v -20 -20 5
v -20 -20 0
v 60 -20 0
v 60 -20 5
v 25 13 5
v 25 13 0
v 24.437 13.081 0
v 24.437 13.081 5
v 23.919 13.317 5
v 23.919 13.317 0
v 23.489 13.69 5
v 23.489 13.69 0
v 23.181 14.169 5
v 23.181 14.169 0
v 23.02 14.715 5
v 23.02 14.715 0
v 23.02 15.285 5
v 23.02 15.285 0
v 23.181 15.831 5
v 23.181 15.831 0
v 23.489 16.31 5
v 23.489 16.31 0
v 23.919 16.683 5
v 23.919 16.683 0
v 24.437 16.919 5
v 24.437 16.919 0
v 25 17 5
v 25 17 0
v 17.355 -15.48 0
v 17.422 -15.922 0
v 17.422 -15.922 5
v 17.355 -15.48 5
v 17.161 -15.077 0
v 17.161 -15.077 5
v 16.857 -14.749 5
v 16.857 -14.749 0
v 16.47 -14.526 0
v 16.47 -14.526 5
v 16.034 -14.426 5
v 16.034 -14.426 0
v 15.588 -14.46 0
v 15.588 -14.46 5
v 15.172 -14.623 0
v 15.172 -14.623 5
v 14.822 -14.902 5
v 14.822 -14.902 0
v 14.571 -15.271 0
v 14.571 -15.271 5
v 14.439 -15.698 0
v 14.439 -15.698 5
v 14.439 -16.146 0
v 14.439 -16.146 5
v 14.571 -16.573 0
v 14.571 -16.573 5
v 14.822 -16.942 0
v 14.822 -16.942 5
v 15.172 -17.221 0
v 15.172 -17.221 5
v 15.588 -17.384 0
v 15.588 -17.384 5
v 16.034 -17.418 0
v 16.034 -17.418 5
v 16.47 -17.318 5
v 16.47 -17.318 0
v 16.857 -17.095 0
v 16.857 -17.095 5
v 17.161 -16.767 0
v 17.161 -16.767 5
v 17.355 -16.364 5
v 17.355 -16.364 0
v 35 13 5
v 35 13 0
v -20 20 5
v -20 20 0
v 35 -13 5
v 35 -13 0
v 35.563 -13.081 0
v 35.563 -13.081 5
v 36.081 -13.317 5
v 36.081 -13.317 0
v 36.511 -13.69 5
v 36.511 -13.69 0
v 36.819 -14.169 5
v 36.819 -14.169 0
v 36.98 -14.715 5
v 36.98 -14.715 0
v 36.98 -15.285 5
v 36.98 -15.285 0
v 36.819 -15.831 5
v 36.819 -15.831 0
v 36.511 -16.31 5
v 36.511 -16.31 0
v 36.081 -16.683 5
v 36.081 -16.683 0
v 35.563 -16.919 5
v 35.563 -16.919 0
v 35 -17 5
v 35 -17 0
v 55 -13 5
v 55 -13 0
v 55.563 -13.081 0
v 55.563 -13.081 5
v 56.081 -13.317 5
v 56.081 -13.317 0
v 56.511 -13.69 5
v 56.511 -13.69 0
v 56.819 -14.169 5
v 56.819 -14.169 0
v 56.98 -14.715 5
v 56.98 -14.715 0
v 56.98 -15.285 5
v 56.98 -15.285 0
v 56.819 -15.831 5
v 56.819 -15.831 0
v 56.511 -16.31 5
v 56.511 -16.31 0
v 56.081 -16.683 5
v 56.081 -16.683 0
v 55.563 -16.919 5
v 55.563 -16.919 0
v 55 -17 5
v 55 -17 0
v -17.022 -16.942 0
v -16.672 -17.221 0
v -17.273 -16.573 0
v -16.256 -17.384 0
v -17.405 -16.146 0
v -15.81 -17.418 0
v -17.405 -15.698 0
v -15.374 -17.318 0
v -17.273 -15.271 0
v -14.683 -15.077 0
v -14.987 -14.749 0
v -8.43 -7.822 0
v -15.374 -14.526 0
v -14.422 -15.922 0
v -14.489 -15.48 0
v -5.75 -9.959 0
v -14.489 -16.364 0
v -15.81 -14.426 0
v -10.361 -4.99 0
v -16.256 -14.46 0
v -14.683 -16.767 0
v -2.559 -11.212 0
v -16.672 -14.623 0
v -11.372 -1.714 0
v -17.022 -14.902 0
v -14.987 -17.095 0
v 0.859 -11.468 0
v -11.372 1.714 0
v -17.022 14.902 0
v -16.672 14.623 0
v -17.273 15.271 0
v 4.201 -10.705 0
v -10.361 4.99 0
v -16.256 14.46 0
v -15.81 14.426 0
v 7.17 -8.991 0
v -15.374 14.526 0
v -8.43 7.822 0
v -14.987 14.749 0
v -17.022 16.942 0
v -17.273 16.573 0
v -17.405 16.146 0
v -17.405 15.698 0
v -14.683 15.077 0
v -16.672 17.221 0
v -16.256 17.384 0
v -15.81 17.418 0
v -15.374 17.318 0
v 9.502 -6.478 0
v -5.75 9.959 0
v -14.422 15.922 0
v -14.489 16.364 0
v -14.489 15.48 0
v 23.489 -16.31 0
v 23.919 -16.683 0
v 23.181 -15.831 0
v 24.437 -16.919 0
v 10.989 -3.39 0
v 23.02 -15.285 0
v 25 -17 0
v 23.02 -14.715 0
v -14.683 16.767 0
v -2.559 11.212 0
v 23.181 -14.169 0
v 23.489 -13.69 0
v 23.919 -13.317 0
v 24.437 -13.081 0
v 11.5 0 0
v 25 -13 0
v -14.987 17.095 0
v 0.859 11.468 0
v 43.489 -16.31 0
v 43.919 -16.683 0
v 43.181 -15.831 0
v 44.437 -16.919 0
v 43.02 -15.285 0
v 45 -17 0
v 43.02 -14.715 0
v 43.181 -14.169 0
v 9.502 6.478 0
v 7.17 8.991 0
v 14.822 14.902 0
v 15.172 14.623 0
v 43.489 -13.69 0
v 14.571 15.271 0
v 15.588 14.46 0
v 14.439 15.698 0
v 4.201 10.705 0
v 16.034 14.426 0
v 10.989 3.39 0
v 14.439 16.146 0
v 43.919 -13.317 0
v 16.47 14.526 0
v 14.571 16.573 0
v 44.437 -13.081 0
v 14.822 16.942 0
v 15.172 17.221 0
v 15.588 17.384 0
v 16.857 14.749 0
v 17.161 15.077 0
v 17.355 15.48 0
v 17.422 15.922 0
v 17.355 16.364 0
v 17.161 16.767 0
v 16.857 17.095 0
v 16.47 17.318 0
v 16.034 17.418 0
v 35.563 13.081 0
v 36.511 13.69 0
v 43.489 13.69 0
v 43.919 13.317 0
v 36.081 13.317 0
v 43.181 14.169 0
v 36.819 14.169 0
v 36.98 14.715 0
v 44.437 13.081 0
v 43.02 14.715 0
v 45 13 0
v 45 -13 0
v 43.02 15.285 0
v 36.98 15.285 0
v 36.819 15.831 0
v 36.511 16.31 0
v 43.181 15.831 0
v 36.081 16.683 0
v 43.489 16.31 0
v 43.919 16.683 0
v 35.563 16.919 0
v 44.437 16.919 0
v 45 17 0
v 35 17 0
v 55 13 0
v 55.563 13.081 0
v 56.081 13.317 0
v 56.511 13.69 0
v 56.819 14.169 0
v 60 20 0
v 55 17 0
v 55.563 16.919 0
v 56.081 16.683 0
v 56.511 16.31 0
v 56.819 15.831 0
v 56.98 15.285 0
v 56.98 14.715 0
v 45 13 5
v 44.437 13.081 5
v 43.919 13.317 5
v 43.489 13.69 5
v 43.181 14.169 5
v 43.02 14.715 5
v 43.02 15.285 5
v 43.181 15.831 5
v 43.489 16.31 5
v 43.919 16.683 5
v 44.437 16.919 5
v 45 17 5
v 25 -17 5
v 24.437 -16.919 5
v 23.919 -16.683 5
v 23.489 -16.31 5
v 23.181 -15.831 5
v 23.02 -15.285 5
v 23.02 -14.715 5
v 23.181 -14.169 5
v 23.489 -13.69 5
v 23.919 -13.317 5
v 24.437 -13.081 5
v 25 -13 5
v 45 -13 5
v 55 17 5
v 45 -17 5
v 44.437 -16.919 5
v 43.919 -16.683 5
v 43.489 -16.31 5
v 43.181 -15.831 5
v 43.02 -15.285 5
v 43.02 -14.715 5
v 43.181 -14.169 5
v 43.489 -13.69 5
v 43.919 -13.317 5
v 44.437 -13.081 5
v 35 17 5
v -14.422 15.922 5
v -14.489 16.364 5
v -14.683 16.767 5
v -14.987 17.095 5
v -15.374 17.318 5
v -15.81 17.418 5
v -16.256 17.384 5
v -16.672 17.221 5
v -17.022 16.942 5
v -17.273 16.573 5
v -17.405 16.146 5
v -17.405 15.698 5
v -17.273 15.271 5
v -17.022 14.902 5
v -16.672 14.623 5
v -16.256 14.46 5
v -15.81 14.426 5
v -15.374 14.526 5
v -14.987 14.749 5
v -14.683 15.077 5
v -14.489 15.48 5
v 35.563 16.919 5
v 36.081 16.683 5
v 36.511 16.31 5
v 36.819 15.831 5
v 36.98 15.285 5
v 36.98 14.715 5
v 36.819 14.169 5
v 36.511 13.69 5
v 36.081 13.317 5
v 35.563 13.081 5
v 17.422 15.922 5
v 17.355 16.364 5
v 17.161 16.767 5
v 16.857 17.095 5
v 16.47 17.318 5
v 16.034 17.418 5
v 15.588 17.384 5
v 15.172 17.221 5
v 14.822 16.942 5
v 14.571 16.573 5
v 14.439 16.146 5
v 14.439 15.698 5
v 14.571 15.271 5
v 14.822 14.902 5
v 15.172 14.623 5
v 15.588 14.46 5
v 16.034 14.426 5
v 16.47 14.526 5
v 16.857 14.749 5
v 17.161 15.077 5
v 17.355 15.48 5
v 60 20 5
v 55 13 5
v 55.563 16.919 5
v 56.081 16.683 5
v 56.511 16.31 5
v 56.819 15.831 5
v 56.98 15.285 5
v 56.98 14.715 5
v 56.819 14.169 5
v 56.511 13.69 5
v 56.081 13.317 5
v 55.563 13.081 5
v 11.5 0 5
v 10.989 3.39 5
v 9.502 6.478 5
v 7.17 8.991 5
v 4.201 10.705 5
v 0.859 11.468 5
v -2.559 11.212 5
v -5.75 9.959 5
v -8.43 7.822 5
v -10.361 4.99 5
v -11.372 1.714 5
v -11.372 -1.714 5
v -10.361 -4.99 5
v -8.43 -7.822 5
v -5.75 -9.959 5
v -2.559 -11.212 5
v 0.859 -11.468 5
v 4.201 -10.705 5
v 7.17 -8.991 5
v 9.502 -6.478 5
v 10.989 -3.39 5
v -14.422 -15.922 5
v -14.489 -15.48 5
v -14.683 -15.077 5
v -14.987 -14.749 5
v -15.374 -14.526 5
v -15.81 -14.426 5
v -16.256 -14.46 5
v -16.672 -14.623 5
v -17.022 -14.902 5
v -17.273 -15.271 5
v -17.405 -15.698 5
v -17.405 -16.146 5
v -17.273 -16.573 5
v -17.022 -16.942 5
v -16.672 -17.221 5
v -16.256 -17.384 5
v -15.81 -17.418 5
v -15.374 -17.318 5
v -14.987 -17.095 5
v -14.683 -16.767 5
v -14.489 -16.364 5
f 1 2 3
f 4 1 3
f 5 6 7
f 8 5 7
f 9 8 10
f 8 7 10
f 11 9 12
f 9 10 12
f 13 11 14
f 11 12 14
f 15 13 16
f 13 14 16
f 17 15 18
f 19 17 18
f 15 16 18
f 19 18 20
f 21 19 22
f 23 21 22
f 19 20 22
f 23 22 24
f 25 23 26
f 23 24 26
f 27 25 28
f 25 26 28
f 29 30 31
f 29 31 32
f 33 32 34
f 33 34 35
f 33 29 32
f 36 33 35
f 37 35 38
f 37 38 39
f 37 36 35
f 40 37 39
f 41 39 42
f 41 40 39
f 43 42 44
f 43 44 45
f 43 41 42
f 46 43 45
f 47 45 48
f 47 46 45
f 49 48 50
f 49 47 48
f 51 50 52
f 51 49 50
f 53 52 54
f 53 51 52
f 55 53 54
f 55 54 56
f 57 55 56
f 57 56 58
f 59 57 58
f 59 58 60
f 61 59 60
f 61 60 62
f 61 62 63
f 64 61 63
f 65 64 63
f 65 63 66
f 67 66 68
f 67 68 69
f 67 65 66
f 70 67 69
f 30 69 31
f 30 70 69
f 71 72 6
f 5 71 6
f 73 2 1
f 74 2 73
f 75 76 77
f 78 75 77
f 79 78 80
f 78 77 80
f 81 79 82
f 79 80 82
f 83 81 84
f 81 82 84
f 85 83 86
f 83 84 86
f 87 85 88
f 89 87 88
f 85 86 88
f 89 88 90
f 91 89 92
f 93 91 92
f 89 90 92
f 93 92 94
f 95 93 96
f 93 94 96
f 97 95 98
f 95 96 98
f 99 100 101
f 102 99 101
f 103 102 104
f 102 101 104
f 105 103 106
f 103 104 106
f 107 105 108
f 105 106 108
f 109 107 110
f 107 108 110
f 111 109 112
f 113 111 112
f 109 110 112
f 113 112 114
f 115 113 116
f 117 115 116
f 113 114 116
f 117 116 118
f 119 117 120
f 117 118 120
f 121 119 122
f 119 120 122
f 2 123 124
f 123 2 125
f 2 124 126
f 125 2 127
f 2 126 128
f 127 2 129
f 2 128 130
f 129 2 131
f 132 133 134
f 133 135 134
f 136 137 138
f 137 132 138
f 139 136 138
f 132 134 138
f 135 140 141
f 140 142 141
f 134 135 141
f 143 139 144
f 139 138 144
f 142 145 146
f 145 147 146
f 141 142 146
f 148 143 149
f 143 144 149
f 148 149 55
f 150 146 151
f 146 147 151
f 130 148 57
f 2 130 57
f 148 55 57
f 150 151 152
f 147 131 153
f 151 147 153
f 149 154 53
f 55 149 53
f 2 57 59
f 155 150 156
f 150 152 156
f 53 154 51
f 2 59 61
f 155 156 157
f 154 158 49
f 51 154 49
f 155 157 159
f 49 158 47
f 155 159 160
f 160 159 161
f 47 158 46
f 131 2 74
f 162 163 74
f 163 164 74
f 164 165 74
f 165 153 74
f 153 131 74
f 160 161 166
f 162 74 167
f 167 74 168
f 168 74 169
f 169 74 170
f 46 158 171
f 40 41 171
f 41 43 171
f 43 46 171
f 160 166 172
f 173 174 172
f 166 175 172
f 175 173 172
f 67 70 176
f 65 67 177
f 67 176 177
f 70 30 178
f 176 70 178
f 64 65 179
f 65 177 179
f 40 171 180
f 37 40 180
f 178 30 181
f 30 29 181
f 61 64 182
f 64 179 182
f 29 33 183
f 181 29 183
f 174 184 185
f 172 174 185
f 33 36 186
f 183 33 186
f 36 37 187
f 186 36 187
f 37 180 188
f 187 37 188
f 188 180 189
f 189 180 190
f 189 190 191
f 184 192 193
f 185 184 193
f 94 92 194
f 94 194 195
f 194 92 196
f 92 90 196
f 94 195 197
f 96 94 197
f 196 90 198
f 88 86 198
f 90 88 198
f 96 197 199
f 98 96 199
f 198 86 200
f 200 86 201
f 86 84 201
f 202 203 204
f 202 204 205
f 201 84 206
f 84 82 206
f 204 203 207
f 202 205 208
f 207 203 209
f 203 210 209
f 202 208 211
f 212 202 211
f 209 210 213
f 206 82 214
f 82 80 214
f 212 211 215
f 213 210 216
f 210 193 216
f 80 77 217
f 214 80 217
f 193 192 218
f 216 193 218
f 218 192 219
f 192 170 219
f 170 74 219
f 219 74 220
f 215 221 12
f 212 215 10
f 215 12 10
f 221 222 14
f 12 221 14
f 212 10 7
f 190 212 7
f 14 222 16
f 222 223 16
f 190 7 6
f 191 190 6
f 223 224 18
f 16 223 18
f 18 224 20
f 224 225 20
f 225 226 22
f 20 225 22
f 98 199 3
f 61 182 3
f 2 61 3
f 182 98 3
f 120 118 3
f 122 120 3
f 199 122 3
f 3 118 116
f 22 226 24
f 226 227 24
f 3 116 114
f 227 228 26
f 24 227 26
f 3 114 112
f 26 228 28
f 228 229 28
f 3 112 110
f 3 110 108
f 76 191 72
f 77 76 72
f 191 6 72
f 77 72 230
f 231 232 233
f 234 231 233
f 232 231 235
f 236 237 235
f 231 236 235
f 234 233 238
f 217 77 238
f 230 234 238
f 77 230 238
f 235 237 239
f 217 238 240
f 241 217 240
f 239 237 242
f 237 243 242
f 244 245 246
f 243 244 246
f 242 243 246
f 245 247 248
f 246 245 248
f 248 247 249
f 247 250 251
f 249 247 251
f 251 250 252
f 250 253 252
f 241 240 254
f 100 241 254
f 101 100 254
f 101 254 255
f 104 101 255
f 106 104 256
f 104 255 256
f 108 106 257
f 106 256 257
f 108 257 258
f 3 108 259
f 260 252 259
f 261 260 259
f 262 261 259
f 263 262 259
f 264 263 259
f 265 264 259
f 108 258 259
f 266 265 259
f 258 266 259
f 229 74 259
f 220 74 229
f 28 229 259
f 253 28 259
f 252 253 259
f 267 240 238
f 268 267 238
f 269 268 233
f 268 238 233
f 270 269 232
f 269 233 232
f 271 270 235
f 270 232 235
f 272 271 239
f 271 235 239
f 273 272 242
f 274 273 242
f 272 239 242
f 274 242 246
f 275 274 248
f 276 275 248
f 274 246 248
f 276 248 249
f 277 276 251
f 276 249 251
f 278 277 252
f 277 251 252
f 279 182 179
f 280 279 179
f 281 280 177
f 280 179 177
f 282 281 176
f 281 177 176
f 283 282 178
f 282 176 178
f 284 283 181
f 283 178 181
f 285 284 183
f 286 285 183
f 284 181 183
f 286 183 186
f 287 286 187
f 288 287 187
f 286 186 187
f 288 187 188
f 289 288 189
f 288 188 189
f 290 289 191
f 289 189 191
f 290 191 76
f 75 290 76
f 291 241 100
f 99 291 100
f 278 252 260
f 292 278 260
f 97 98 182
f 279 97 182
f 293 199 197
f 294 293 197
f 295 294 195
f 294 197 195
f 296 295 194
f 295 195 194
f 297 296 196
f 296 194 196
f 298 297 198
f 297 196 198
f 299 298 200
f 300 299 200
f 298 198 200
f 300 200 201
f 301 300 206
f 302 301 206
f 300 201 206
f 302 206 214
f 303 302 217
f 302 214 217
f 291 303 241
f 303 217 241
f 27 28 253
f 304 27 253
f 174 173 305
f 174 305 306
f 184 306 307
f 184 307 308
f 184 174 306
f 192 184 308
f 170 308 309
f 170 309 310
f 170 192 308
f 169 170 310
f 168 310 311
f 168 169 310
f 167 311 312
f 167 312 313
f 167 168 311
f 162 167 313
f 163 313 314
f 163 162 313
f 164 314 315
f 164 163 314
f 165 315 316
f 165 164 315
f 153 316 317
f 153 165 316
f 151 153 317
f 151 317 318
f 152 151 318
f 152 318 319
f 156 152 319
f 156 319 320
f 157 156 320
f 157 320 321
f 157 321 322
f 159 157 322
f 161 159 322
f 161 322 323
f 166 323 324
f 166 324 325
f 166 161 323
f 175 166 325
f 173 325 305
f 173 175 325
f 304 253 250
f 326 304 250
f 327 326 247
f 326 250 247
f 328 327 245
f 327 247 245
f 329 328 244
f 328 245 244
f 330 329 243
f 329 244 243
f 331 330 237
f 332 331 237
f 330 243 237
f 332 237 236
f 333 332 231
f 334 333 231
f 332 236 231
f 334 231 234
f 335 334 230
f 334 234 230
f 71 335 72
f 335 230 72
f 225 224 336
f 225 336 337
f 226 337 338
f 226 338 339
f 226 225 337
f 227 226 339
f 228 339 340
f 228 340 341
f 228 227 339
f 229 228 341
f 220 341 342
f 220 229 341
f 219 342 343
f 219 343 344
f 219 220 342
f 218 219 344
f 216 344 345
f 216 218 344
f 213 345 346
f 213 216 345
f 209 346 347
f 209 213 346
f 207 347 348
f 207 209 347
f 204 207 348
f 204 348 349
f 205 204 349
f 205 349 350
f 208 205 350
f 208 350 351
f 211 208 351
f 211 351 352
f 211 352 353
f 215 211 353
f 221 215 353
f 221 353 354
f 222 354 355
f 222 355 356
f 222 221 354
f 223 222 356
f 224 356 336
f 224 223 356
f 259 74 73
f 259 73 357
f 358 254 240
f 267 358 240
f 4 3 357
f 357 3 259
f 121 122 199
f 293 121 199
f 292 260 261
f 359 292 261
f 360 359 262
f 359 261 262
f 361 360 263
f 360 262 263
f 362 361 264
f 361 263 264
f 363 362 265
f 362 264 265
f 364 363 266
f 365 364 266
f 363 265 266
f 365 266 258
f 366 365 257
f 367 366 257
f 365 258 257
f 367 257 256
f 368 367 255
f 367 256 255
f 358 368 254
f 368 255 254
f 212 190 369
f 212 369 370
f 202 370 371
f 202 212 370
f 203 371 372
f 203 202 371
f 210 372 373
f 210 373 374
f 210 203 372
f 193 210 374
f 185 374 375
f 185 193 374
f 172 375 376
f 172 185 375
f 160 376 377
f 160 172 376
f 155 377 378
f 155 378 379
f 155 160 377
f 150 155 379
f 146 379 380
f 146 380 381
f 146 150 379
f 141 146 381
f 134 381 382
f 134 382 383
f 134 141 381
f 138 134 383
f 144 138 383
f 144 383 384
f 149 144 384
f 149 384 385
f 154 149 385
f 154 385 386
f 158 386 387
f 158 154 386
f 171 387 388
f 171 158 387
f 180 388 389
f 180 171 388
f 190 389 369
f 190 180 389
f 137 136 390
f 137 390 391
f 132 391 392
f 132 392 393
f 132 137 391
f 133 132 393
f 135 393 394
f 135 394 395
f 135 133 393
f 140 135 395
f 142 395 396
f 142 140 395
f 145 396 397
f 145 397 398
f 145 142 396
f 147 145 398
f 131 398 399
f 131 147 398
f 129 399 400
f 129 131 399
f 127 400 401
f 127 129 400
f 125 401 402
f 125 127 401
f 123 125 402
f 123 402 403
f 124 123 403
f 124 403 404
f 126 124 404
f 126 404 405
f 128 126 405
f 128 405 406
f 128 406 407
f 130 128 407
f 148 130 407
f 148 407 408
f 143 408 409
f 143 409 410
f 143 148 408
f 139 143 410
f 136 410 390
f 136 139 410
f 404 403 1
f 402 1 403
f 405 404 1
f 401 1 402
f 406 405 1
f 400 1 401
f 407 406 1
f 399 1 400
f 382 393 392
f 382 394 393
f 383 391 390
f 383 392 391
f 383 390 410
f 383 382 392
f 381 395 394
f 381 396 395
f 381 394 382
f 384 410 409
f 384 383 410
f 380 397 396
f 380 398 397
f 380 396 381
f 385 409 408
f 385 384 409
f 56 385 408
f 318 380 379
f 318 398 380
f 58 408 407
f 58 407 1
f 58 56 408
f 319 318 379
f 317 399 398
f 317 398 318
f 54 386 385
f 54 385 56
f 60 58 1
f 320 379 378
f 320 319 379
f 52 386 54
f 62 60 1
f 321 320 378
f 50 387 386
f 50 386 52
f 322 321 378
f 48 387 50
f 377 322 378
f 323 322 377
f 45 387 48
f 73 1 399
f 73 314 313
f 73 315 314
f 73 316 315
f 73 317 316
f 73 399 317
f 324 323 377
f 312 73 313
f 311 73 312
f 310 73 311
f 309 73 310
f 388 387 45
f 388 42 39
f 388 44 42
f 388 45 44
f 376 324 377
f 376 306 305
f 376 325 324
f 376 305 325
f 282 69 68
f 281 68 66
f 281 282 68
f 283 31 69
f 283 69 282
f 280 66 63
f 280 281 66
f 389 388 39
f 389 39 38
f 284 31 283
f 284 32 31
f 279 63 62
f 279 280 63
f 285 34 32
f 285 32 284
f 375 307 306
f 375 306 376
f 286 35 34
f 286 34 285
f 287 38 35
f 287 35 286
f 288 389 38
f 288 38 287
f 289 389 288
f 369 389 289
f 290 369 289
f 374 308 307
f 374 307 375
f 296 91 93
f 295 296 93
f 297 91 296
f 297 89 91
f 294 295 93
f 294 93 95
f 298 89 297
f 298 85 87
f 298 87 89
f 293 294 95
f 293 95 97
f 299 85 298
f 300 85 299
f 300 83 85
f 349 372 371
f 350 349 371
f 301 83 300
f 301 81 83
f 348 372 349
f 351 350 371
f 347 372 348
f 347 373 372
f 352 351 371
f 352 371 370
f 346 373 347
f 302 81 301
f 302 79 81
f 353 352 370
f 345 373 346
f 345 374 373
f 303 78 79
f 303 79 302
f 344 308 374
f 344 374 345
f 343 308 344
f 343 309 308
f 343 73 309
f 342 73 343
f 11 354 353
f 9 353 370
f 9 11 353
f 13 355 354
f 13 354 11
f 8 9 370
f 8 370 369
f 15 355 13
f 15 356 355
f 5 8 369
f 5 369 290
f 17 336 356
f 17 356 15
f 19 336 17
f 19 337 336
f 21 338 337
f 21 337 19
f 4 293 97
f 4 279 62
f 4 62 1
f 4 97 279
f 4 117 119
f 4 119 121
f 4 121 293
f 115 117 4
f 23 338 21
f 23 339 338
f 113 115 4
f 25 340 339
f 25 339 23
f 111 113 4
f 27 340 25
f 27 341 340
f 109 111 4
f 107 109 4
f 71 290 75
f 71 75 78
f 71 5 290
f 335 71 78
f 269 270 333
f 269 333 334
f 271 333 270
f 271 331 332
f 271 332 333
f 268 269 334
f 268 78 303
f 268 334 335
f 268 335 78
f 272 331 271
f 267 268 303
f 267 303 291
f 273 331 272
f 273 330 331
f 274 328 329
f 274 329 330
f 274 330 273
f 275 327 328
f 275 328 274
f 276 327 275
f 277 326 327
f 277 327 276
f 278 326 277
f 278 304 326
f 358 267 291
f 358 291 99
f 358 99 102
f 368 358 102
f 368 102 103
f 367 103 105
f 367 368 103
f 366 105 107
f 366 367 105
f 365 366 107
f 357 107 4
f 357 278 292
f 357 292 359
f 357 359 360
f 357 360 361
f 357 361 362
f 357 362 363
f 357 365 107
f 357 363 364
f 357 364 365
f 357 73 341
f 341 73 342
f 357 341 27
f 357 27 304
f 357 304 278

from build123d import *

# Parameters (mm, degrees)
SKETCH1_W           = 80
SKETCH1_H           = 40
SKETCH1_R           = 1.5
SKETCH1_R_2         = 11.5
BOSS_EXTRUDE1_DEPTH = 5


with BuildPart() as part:
    # Sketch1 → Boss-Extrude1 (new body)
    with BuildSketch(Plane.XY):
        with Locations((20, 0)):
            Rectangle(SKETCH1_W, SKETCH1_H)
        with Locations((-15.922, 15.922)):
            Circle(SKETCH1_R, mode=Mode.SUBTRACT)
        with Locations((15.922, 15.922)):
            Circle(SKETCH1_R, mode=Mode.SUBTRACT)
        with Locations((15.922, -15.922)):
            Circle(SKETCH1_R, mode=Mode.SUBTRACT)
        with Locations((-15.922, -15.922)):
            Circle(SKETCH1_R, mode=Mode.SUBTRACT)
        Circle(SKETCH1_R_2, mode=Mode.SUBTRACT)
        with BuildLine():
            Line((25, 17), (35, 17))
            ThreePointArc((35, 17), (37, 15), (35, 13))
            Line((35, 13), (25, 13))
            ThreePointArc((25, 13), (23, 15), (25, 17))
        make_face(mode=Mode.SUBTRACT)
        with BuildLine():
            Line((45, 17), (55, 17))
            ThreePointArc((55, 17), (57, 15), (55, 13))
            Line((55, 13), (45, 13))
            ThreePointArc((45, 13), (43, 15), (45, 17))
        make_face(mode=Mode.SUBTRACT)
        with BuildLine():
            Line((45, -13), (55, -13))
            ThreePointArc((55, -13), (57, -15), (55, -17))
            Line((55, -17), (45, -17))
            ThreePointArc((45, -17), (43, -15), (45, -13))
        make_face(mode=Mode.SUBTRACT)
        with BuildLine():
            Line((25, -13), (35, -13))
            ThreePointArc((35, -13), (37, -15), (35, -17))
            Line((35, -17), (25, -17))
            ThreePointArc((25, -17), (23, -15), (25, -13))
        make_face(mode=Mode.SUBTRACT)
    extrude(amount=BOSS_EXTRUDE1_DEPTH)


solid = part.part
